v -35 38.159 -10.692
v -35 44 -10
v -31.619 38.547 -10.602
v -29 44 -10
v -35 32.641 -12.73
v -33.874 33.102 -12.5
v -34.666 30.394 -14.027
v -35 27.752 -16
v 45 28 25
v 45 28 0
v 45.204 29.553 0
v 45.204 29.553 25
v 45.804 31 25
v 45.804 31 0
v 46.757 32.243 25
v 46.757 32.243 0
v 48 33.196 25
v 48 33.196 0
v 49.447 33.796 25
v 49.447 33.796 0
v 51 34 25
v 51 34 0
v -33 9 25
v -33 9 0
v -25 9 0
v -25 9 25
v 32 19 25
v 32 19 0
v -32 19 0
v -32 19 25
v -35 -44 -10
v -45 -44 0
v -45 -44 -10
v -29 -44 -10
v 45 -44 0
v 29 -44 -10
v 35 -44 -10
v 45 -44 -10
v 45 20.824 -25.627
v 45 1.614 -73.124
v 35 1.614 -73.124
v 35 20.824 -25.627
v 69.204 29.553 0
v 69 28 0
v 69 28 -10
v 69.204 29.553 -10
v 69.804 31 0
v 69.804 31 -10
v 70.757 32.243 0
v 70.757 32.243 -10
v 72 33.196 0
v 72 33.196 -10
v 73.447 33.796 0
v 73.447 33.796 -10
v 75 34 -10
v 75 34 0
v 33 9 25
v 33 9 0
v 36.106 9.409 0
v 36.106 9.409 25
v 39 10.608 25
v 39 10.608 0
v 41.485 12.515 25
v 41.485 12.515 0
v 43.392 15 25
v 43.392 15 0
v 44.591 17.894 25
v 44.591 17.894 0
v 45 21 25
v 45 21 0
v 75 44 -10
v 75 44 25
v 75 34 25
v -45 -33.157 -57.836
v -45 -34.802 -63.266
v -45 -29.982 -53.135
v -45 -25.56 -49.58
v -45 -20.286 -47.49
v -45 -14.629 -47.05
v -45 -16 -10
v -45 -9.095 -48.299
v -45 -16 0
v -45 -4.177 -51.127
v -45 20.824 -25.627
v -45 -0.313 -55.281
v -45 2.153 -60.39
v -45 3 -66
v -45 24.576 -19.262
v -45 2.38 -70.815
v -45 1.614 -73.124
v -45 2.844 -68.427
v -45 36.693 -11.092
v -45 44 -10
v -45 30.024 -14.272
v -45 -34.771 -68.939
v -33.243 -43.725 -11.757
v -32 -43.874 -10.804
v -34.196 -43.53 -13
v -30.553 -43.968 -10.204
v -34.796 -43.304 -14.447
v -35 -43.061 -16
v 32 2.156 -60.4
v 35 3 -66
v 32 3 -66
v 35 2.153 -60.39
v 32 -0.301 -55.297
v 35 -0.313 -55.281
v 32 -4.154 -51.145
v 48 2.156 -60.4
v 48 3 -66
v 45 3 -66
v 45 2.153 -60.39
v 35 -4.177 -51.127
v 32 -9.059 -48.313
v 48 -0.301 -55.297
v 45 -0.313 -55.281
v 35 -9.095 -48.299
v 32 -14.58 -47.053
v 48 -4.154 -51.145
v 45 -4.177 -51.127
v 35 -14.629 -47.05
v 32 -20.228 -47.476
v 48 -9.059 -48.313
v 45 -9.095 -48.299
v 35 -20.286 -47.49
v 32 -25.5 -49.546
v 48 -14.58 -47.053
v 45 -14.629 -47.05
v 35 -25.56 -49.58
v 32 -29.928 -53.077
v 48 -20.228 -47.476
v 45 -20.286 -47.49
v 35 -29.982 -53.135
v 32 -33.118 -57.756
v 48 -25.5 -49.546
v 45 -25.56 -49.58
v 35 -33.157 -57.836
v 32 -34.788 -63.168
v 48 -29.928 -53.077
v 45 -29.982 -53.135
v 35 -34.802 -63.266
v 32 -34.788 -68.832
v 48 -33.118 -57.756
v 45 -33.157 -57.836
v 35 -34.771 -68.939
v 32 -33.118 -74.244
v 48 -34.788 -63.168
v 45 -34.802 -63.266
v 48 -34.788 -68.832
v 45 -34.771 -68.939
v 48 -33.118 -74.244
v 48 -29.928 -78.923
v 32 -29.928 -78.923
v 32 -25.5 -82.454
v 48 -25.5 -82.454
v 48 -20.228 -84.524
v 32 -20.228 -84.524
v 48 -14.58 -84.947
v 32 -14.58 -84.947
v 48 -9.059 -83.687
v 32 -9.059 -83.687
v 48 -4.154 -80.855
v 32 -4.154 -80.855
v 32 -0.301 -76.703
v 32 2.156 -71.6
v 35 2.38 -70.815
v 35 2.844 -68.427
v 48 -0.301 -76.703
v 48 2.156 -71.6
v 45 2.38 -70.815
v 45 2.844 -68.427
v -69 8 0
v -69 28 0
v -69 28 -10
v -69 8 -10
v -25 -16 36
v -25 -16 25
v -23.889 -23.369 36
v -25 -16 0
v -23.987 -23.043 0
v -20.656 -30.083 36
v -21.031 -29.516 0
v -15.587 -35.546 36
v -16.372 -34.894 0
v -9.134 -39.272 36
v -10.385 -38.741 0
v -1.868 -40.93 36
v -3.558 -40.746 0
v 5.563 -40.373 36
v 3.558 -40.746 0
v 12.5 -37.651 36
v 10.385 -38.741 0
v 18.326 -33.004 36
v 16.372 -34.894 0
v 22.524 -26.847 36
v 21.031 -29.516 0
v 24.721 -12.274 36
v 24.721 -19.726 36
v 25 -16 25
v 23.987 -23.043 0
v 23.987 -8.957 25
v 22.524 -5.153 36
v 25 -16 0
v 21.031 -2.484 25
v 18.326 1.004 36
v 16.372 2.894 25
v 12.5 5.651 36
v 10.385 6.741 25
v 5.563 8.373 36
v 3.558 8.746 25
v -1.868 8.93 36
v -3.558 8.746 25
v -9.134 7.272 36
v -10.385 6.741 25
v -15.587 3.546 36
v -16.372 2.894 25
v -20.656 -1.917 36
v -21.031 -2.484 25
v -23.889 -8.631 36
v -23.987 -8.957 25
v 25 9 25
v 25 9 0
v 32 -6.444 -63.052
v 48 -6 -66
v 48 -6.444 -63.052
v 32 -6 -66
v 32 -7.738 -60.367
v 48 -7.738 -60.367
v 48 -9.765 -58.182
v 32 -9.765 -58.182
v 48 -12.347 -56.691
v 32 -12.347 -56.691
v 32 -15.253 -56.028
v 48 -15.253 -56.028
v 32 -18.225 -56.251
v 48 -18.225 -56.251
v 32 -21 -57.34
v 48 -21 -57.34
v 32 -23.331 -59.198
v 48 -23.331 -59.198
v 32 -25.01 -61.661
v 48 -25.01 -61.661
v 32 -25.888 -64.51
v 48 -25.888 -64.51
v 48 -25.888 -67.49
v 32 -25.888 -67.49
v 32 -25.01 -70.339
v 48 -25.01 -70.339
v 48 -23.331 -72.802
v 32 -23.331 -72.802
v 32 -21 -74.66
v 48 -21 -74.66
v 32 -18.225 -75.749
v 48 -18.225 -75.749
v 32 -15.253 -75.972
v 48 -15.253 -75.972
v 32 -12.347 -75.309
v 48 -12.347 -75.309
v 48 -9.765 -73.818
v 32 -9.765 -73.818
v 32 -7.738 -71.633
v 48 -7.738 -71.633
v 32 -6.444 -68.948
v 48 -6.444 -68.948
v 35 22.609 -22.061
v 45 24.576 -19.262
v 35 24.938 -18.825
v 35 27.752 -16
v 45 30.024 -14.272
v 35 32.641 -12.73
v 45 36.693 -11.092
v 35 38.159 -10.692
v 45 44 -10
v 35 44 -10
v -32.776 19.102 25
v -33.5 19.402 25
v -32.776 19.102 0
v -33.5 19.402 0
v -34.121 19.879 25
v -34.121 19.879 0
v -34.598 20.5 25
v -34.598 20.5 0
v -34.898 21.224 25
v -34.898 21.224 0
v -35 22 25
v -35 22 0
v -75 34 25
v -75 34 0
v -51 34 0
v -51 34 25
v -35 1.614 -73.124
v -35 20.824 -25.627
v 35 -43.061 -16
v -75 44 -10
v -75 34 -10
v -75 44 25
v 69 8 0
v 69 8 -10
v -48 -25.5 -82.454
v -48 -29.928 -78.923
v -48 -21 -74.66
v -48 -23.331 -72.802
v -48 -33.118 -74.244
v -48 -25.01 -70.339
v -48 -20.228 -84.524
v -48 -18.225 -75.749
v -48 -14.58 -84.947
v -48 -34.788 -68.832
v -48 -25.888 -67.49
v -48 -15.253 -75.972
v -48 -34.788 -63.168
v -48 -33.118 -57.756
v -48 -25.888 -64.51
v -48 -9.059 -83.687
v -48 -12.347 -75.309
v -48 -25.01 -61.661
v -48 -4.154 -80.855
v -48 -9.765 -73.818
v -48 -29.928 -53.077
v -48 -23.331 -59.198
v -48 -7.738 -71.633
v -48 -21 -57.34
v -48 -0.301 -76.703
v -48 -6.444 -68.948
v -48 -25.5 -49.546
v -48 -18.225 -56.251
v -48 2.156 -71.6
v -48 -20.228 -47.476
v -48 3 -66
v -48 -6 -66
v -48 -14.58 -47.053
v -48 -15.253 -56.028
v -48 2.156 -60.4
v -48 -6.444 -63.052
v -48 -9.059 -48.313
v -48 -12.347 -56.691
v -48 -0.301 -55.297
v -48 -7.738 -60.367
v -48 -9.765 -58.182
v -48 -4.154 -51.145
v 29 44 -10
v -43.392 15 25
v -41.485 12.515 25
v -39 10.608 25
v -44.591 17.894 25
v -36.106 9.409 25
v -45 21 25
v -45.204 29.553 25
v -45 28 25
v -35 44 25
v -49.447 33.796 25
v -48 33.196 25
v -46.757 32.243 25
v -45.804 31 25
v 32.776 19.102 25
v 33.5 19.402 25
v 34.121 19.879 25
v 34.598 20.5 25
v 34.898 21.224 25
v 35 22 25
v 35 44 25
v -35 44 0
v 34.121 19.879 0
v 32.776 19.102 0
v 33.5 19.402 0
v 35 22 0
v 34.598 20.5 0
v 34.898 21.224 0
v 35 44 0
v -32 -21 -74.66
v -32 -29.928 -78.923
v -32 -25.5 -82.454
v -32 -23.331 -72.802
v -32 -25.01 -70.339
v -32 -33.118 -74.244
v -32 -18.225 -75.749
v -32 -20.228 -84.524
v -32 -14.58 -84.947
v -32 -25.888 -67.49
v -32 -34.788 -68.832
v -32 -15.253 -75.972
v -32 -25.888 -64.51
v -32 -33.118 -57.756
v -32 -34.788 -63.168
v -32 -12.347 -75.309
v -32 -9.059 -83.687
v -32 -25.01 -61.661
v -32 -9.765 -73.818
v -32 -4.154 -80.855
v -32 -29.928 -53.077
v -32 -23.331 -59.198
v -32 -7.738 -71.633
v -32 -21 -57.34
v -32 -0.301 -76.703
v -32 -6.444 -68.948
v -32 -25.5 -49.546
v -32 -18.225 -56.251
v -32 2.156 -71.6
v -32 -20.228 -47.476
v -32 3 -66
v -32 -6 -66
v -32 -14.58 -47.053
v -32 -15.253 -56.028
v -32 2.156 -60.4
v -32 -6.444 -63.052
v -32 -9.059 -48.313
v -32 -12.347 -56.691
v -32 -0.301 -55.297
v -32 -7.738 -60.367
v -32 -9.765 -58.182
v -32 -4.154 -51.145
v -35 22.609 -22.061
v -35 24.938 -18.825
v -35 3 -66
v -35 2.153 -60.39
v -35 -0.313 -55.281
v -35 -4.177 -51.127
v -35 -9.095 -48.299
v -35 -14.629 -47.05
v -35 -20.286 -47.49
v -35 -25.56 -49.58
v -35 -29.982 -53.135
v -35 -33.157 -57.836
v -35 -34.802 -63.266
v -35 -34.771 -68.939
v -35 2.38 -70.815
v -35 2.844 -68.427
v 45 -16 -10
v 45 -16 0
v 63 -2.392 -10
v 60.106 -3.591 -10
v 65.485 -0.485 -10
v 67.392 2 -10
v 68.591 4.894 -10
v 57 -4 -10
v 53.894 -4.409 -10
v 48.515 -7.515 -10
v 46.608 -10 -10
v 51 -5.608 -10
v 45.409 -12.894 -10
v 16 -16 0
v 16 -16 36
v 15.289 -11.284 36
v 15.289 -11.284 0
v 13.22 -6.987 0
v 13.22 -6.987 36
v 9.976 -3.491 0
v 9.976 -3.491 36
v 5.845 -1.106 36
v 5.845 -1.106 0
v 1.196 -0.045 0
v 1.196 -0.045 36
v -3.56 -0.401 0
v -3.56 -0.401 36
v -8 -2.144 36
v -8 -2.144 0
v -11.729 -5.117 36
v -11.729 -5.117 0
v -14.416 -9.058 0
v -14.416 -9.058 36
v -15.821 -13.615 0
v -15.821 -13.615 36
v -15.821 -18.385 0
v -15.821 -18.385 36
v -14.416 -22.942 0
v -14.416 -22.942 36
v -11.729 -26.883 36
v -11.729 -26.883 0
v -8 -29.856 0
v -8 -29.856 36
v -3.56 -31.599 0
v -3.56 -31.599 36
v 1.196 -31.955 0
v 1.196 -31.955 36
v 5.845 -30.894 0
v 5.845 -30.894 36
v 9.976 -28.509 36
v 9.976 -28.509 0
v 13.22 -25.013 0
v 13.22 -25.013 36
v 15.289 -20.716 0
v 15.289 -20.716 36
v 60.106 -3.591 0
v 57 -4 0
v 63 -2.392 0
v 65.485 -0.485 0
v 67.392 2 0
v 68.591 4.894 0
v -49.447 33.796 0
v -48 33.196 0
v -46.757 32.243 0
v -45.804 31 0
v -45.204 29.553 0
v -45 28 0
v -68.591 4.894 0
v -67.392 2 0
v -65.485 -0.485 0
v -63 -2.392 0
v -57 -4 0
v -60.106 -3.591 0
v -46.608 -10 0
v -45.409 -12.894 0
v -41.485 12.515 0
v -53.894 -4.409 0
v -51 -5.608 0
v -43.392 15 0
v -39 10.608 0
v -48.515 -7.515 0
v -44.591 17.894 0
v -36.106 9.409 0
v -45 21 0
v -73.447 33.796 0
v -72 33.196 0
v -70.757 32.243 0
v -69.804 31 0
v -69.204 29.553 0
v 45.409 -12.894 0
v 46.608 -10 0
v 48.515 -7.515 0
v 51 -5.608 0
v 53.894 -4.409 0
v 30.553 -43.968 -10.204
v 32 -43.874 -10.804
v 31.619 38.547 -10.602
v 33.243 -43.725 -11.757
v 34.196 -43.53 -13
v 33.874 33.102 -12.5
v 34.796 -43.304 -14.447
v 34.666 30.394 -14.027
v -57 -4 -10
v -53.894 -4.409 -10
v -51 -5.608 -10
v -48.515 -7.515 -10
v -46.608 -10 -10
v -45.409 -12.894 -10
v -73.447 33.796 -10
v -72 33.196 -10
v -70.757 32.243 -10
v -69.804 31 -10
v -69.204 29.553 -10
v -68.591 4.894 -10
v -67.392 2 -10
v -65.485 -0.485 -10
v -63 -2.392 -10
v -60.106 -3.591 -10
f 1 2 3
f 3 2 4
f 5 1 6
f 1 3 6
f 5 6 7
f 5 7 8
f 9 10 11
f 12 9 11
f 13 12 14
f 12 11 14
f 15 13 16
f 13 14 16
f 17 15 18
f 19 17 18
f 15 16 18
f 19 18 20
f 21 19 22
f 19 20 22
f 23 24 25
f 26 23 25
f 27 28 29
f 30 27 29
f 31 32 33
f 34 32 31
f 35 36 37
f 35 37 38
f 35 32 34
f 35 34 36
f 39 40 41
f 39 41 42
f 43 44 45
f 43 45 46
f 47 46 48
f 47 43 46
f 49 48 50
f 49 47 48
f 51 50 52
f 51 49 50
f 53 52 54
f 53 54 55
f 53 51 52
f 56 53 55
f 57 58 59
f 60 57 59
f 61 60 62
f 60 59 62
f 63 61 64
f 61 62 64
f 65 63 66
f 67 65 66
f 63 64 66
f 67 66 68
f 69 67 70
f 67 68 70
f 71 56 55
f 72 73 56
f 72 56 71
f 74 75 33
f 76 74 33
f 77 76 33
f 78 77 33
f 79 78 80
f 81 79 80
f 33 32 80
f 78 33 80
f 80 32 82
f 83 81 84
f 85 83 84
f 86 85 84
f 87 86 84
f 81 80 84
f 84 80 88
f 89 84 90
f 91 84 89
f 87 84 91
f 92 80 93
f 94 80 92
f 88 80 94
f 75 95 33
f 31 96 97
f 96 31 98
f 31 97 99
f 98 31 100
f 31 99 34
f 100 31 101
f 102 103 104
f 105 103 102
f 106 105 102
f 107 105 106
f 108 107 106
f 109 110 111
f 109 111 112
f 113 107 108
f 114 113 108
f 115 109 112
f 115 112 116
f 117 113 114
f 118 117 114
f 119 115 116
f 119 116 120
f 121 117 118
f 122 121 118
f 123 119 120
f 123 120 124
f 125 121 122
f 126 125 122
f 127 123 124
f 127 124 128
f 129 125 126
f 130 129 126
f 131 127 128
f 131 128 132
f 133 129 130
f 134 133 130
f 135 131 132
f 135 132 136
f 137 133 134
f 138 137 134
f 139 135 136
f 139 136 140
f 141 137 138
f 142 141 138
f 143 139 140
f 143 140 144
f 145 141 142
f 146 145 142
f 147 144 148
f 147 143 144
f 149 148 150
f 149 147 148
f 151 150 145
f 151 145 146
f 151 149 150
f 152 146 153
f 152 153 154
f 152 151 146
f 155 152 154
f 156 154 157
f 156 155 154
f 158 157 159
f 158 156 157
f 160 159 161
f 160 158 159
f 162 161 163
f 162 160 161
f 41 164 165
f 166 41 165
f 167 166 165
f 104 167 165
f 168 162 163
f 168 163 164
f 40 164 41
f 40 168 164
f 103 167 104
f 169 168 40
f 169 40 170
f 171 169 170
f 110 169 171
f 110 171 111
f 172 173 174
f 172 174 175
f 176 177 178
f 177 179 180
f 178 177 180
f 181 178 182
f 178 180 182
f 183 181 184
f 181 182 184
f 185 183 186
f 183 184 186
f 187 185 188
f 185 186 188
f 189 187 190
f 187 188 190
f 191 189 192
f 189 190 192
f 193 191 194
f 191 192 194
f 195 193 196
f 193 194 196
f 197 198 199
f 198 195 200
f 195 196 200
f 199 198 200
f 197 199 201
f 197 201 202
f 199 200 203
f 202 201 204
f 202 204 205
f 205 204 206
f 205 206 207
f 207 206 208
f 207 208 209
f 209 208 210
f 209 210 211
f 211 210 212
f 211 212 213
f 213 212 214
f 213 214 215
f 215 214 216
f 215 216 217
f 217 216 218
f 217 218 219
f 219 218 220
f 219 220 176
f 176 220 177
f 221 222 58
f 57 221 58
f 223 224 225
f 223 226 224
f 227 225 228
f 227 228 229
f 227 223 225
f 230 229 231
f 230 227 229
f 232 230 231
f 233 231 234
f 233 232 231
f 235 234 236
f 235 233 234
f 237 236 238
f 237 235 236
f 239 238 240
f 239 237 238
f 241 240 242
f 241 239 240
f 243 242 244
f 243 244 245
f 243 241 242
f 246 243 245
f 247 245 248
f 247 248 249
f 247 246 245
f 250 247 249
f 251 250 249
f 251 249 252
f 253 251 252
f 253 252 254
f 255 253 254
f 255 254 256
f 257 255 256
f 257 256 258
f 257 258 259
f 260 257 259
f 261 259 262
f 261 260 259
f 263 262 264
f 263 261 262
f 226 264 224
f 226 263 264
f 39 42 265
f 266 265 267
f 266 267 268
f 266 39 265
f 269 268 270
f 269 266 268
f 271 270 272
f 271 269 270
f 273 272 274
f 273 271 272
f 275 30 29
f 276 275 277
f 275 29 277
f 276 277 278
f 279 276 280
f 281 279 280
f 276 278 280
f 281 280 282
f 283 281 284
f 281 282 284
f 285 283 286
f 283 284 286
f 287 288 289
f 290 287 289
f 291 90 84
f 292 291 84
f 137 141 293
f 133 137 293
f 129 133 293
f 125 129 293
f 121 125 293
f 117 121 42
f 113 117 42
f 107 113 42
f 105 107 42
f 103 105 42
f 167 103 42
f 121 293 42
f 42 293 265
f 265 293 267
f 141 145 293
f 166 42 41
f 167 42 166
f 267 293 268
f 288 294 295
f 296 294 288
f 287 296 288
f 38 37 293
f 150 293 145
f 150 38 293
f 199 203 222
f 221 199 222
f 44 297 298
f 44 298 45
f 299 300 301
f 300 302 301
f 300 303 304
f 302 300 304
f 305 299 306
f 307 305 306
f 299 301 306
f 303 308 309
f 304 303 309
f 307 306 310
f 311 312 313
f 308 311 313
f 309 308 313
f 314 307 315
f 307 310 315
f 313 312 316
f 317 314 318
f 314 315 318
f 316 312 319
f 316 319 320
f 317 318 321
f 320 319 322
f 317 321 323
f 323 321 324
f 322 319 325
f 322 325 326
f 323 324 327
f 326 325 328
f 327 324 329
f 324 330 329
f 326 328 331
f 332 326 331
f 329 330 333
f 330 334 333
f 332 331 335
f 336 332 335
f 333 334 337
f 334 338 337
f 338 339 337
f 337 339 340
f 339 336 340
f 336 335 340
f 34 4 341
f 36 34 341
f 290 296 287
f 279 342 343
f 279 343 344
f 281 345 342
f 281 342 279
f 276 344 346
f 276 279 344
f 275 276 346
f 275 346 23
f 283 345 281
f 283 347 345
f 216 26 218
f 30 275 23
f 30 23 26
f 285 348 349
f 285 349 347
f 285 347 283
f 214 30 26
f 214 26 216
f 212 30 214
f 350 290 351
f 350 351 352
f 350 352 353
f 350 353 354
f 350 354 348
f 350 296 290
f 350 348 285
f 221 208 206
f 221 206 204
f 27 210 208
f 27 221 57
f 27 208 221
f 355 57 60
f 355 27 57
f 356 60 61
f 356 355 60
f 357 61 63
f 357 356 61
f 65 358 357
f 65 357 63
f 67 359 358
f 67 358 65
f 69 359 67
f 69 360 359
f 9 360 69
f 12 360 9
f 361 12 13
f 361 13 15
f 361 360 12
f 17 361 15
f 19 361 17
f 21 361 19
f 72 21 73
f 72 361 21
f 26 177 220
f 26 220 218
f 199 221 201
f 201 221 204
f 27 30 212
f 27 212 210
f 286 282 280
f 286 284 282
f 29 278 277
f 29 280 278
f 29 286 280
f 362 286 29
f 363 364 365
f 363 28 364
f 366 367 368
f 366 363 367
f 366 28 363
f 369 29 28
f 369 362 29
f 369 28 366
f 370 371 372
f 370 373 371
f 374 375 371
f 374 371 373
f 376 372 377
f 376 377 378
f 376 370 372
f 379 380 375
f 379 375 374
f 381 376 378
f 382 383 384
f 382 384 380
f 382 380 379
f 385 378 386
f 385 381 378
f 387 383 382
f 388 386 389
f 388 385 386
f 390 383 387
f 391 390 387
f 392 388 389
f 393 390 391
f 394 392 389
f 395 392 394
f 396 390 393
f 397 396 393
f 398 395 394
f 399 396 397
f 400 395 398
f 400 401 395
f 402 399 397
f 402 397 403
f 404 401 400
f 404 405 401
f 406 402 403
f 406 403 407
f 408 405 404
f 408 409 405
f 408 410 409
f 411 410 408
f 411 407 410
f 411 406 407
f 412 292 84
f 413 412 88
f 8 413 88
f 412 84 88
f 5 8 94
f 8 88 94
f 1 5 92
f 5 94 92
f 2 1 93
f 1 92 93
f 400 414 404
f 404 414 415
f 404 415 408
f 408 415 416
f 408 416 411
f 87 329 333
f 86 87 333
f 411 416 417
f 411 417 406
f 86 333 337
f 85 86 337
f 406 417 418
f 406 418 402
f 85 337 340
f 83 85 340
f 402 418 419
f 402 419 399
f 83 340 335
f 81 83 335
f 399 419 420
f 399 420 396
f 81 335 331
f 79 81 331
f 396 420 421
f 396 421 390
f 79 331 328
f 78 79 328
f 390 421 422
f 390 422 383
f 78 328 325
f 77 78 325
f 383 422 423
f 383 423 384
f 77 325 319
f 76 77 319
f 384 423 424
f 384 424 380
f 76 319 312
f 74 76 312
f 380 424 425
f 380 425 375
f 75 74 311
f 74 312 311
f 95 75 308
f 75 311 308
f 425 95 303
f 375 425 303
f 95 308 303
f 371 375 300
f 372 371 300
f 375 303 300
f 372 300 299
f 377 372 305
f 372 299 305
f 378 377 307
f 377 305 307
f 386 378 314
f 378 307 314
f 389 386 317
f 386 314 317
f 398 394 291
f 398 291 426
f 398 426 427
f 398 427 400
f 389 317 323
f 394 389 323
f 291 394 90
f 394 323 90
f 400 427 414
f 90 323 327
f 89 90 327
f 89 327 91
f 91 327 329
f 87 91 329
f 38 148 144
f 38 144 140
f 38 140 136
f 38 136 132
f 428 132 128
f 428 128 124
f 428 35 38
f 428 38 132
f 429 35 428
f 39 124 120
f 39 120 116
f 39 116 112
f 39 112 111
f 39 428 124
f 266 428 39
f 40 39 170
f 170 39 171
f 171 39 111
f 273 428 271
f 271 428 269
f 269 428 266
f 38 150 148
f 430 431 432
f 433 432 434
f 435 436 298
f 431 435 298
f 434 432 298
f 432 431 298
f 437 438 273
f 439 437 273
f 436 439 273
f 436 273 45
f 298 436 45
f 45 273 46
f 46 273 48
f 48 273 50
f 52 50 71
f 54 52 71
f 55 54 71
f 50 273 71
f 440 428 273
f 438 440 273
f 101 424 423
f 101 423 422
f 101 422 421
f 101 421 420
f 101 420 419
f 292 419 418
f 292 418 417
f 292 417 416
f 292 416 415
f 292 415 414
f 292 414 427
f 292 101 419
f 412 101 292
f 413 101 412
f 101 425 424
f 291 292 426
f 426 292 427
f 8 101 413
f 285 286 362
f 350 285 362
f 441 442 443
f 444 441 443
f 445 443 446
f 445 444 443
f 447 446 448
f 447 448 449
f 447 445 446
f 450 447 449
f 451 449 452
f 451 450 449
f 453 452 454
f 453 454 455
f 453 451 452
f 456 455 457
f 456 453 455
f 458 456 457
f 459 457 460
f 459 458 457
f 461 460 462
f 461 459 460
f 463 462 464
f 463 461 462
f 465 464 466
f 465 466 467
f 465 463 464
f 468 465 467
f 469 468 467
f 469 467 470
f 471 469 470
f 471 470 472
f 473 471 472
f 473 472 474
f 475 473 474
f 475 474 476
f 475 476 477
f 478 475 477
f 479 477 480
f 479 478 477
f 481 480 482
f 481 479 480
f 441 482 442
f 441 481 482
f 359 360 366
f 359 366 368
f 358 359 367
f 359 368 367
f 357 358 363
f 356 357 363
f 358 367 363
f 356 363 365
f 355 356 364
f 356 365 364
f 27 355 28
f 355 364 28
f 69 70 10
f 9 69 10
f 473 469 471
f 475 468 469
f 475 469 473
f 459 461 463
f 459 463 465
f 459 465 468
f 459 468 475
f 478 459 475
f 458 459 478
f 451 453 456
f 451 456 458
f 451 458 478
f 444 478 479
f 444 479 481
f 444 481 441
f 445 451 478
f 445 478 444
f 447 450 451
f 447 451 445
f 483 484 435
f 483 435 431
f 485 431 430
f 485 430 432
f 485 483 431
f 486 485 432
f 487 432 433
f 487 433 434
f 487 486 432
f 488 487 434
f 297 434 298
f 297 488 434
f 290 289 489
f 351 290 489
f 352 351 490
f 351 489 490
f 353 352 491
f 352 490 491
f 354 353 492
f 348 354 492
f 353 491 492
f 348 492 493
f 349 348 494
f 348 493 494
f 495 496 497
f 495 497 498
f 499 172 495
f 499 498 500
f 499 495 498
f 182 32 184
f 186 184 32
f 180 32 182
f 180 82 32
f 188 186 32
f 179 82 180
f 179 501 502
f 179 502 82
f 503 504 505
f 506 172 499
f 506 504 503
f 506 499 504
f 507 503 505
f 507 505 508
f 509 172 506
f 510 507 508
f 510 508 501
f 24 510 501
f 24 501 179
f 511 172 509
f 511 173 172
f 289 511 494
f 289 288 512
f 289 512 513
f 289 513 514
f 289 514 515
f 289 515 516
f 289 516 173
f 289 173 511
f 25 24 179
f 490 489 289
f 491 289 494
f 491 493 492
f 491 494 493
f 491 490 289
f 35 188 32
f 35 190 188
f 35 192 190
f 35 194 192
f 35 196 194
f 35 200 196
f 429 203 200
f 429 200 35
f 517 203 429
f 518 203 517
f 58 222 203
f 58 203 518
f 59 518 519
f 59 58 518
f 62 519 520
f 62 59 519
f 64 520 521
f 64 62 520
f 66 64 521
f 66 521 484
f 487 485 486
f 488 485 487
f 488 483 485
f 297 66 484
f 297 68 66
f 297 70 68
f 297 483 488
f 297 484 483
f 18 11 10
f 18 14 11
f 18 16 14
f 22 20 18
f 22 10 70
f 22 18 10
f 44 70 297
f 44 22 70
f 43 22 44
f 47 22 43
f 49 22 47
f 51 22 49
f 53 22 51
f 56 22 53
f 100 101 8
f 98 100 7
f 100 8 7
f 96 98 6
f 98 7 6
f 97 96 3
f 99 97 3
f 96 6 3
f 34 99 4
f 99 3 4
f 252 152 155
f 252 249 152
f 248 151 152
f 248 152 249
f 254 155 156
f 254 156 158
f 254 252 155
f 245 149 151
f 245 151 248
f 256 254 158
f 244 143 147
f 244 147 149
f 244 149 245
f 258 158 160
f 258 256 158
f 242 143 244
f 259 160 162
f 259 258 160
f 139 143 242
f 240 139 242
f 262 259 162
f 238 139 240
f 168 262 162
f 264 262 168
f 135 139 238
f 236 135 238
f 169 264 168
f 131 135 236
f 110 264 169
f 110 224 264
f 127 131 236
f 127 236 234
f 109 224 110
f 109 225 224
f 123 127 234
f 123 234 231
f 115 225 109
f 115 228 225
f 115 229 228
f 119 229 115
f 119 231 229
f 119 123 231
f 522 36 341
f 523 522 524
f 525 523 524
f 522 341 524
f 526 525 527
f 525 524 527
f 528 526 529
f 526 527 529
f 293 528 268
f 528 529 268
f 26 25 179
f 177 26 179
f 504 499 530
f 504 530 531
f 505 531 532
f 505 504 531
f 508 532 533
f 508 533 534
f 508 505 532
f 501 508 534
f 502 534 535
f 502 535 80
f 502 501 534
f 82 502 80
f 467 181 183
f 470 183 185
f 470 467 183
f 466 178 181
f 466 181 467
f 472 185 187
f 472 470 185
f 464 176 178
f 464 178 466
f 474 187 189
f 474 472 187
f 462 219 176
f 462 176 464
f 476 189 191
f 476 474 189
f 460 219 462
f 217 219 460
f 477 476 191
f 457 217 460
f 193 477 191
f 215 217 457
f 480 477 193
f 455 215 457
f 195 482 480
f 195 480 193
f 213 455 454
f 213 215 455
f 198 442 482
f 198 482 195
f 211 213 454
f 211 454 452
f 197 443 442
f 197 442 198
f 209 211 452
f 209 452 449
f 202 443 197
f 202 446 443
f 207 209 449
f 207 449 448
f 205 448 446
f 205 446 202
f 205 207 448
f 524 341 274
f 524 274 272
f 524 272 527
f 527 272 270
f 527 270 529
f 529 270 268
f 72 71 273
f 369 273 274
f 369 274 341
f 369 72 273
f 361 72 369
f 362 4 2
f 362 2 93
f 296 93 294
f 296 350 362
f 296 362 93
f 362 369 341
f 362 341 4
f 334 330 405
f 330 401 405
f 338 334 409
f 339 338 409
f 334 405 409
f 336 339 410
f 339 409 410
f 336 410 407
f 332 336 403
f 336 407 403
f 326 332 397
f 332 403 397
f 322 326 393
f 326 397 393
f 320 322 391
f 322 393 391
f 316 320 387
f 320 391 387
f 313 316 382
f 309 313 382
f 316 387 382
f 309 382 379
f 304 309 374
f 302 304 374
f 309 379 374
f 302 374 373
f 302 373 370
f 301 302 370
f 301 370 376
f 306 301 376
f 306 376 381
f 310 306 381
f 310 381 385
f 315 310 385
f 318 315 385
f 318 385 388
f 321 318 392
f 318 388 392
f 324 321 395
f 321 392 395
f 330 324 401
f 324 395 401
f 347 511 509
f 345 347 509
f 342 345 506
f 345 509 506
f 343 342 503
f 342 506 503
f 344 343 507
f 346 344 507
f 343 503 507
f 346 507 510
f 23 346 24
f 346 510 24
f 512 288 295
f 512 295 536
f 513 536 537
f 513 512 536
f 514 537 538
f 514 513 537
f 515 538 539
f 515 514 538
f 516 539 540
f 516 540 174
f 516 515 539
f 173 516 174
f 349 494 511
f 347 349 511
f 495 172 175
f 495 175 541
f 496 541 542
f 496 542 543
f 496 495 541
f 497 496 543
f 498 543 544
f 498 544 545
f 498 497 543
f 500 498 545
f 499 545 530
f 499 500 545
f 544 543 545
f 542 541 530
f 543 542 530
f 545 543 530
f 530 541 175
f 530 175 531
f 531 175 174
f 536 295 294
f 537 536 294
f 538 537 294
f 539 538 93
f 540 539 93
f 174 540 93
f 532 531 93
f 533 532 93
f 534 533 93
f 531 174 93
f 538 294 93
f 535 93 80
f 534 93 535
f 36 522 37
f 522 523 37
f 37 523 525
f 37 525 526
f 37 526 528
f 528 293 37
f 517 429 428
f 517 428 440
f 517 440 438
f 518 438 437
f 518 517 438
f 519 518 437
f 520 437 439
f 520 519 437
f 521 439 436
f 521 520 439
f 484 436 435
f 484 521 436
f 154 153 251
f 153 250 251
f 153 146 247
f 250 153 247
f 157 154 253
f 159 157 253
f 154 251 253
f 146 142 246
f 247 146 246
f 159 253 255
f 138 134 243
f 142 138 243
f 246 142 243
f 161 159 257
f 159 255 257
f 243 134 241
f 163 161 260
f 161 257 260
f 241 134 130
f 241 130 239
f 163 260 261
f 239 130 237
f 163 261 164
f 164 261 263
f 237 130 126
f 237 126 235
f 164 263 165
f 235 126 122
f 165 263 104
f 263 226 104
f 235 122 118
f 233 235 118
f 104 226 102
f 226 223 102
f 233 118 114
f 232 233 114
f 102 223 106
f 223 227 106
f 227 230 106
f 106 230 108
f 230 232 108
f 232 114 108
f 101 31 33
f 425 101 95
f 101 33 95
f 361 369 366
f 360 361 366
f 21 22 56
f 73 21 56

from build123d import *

# Parameters (mm, degrees)
F1_DEPTH      = 25
F0_R          = 16
F2_DEPTH      = 36
F4_DEPTH      = 10
F6_DEPTH      = 10
F8_R          = 19
F8_R_2        = 10
F9_DEPTH      = 8
F10_T4_DEPTH  = 103
F10_S6_R      = 25
F10_T7_DEPTH  = 53
F10_T11_DEPTH = 103
F10_S13_R     = 25
F10_T14_DEPTH = 53


# Not quite as in the source:
# - a fillet or chamfer that OpenCascade refuses, or shapes differently, is made with other operations: its cross-section is extruded or revolved along the edge and cut away or added
# - a pattern or mirror of a feature is missing from the dataset's text; its kind, count and spacing are read off the source's solid


with BuildPart() as f1:
    # F0 (on Top) → F1 (new body)
    with BuildSketch(Plane.XY):
        with BuildLine():
            Line((-35, 44), (-75, 44))
            Line((-75, 44), (-75, 34))
            Line((-75, 34), (-51, 34))
            ThreePointArc((-51, 34), (-46.7573593129, 32.2426406871), (-45, 28))
            Line((-45, 28), (-45, 21))
            ThreePointArc((-45, 21), (-41.4852813742, 12.5147186258), (-33, 9))
            Line((-33, 9), (-25, 9))
            Line((-25, 9), (-25, -16))
            ThreePointArc((-25, -16), (0, 9), (25, -16))
            Line((25, -16), (25, 9))
            Line((25, 9), (33, 9))
            ThreePointArc((33, 9), (41.4852813742, 12.5147186258), (45, 21))
            Line((45, 21), (45, 28))
            ThreePointArc((45, 28), (46.7573593129, 32.2426406871), (51, 34))
            Line((51, 34), (75, 34))
            Line((75, 34), (75, 44))
            Line((75, 44), (35, 44))
            Line((35, 44), (35, 34))
            Line((35, 34), (35, 22))
            ThreePointArc((35, 22), (34.1213203436, 19.8786796564), (32, 19))
            Line((32, 19), (-32, 19))
            ThreePointArc((-32, 19), (-34.1213203436, 19.8786796564), (-35, 22))
            Line((-35, 22), (-35, 34))
            Line((-35, 34), (-35, 44))
        make_face()
    extrude(amount=F1_DEPTH)

    # F0 (on Top) → F2 (join)
    with BuildSketch(Plane.XY):
        with BuildLine():
            ThreePointArc((25, -16), (0, 9), (-25, -16))
            ThreePointArc((-25, -16), (0, -41), (25, -16))
        make_face()
        with Locations((0, -16)):
            Circle(F0_R, mode=Mode.SUBTRACT)
    extrude(amount=F2_DEPTH)

    # F3 (on face) → F4 (join)
    with BuildSketch(Plane.XY):
        with BuildLine():
            Line((75, 34), (75, 44))
            Line((75, 44), (-75, 44))
            Line((-75, 44), (-75, 34))
            ThreePointArc((-75, 34), (-70.7573593129, 32.2426406871), (-69, 28))
            Line((-69, 28), (-69, 8))
            ThreePointArc((-69, 8), (-65.4852813742, -0.4852813742), (-57, -4))
            ThreePointArc((-57, -4), (-48.5147186258, -7.5147186258), (-45, -16))
            Line((-45, -16), (-45, -44))
            Line((-45, -44), (45, -44))
            Line((45, -44), (45, -16))
            ThreePointArc((45, -16), (48.5147186258, -7.5147186258), (57, -4))
            ThreePointArc((57, -4), (65.4852813742, -0.4852813742), (69, 8))
            Line((69, 8), (69, 28))
            ThreePointArc((69, 28), (70.7573593129, 32.2426406871), (75, 34))
        make_face()
    extrude(amount=-F4_DEPTH)

    # F5 (on face) → F6 (join)
    with BuildSketch(Plane.YZ.offset(45)):
        with BuildLine():
            ThreePointArc((-34.7712820587, -68.9392124579), (-17.4740489959, -47.0572657845), (3, -66))
            ThreePointArc((3, -66), (2.6502712249, -69.6286889144), (1.6139596592, -73.1237928888))
            Line((1.6139596592, -73.1237928888), (20.8237372905, -25.6265883042))
            ThreePointArc((20.8237372905, -25.6265883042), (30.0238648475, -14.2715739575), (44, -10))
            Line((44, -10), (34, -10))
            Line((34, -10), (-16, -10))
            Line((-16, -10), (-44, -10))
            Line((-44, -10), (-34.7712820587, -68.9392124579))
        make_face()
    f6 = extrude(amount=-F6_DEPTH)

    # F6_copies: F6 across plane
    add(f6.mirror(Plane(origin=(0, 0, 0), x_dir=(0, 0, -1), z_dir=(-1, 0, 0))))

    # F8 (on face) → F9 (join, symmetric)
    with BuildSketch(Plane.YZ.offset(40)):
        with Locations((-16, -66)):
            Circle(F8_R)
        with Locations((-16, -66)):
            Circle(F8_R_2, mode=Mode.SUBTRACT)
    f9 = extrude(amount=F9_DEPTH, both=True)

    # F9_copies: F9 across plane
    add(f9.mirror(Plane(origin=(0, 0, 0), x_dir=(0, 0, -1), z_dir=(-1, 0, 0))))

    # F10: fillet of radius 6 on 2 edges, made by hand


with BuildPart() as f10_tool2:
    # F10_s3 → F10_t4 (new body)
    with BuildSketch(Plane.XZ.offset(-44)):
        with BuildLine():
            ThreePointArc((29, -10), (33.2426406871, -11.7573593129), (35, -16))
            Line((35, -16), (35, -10))
            Line((35, -10), (29, -10))
        make_face()
    extrude(amount=F10_T4_DEPTH)

    split(bisect_by=Plane(origin=(0, -44.4753827877, -6.9639675517), x_dir=(1, 0, 0), z_dir=(0, 0.9879622136, 0.1546953925)), keep=Keep.TOP)

    # F10_s6 → F10_t7 (cut, symmetric)
    with BuildSketch(Plane.YZ.offset(32)):
        with Locations((44, -35)):
            Circle(F10_S6_R)
    extrude(amount=F10_T7_DEPTH, both=True, mode=Mode.SUBTRACT)


with BuildPart() as f1_1:
    add(f1.part)

    # F10_t1: union F10_tool2
    add(f10_tool2.part)


with BuildPart() as f10_tool9:
    # F10_s10 → F10_t11 (new body)
    with BuildSketch(Plane.XZ.offset(-44)):
        with BuildLine():
            ThreePointArc((-35, -16), (-33.2426406871, -11.7573593129), (-29, -10))
            Line((-29, -10), (-35, -10))
            Line((-35, -10), (-35, -16))
        make_face()
    extrude(amount=F10_T11_DEPTH)

    split(bisect_by=Plane(origin=(0, -44.4753827877, -6.9639675517), x_dir=(1, 0, 0), z_dir=(0, 0.9879622136, 0.1546953925)), keep=Keep.TOP)

    # F10_s13 → F10_t14 (cut, symmetric)
    with BuildSketch(Plane.YZ.offset(-32)):
        with Locations((44, -35)):
            Circle(F10_S13_R)
    extrude(amount=F10_T14_DEPTH, both=True, mode=Mode.SUBTRACT)


with BuildPart() as f1_2:
    add(f1_1.part)

    # F10_t8: union F10_tool9
    add(f10_tool9.part)


solid = f1_2.part
